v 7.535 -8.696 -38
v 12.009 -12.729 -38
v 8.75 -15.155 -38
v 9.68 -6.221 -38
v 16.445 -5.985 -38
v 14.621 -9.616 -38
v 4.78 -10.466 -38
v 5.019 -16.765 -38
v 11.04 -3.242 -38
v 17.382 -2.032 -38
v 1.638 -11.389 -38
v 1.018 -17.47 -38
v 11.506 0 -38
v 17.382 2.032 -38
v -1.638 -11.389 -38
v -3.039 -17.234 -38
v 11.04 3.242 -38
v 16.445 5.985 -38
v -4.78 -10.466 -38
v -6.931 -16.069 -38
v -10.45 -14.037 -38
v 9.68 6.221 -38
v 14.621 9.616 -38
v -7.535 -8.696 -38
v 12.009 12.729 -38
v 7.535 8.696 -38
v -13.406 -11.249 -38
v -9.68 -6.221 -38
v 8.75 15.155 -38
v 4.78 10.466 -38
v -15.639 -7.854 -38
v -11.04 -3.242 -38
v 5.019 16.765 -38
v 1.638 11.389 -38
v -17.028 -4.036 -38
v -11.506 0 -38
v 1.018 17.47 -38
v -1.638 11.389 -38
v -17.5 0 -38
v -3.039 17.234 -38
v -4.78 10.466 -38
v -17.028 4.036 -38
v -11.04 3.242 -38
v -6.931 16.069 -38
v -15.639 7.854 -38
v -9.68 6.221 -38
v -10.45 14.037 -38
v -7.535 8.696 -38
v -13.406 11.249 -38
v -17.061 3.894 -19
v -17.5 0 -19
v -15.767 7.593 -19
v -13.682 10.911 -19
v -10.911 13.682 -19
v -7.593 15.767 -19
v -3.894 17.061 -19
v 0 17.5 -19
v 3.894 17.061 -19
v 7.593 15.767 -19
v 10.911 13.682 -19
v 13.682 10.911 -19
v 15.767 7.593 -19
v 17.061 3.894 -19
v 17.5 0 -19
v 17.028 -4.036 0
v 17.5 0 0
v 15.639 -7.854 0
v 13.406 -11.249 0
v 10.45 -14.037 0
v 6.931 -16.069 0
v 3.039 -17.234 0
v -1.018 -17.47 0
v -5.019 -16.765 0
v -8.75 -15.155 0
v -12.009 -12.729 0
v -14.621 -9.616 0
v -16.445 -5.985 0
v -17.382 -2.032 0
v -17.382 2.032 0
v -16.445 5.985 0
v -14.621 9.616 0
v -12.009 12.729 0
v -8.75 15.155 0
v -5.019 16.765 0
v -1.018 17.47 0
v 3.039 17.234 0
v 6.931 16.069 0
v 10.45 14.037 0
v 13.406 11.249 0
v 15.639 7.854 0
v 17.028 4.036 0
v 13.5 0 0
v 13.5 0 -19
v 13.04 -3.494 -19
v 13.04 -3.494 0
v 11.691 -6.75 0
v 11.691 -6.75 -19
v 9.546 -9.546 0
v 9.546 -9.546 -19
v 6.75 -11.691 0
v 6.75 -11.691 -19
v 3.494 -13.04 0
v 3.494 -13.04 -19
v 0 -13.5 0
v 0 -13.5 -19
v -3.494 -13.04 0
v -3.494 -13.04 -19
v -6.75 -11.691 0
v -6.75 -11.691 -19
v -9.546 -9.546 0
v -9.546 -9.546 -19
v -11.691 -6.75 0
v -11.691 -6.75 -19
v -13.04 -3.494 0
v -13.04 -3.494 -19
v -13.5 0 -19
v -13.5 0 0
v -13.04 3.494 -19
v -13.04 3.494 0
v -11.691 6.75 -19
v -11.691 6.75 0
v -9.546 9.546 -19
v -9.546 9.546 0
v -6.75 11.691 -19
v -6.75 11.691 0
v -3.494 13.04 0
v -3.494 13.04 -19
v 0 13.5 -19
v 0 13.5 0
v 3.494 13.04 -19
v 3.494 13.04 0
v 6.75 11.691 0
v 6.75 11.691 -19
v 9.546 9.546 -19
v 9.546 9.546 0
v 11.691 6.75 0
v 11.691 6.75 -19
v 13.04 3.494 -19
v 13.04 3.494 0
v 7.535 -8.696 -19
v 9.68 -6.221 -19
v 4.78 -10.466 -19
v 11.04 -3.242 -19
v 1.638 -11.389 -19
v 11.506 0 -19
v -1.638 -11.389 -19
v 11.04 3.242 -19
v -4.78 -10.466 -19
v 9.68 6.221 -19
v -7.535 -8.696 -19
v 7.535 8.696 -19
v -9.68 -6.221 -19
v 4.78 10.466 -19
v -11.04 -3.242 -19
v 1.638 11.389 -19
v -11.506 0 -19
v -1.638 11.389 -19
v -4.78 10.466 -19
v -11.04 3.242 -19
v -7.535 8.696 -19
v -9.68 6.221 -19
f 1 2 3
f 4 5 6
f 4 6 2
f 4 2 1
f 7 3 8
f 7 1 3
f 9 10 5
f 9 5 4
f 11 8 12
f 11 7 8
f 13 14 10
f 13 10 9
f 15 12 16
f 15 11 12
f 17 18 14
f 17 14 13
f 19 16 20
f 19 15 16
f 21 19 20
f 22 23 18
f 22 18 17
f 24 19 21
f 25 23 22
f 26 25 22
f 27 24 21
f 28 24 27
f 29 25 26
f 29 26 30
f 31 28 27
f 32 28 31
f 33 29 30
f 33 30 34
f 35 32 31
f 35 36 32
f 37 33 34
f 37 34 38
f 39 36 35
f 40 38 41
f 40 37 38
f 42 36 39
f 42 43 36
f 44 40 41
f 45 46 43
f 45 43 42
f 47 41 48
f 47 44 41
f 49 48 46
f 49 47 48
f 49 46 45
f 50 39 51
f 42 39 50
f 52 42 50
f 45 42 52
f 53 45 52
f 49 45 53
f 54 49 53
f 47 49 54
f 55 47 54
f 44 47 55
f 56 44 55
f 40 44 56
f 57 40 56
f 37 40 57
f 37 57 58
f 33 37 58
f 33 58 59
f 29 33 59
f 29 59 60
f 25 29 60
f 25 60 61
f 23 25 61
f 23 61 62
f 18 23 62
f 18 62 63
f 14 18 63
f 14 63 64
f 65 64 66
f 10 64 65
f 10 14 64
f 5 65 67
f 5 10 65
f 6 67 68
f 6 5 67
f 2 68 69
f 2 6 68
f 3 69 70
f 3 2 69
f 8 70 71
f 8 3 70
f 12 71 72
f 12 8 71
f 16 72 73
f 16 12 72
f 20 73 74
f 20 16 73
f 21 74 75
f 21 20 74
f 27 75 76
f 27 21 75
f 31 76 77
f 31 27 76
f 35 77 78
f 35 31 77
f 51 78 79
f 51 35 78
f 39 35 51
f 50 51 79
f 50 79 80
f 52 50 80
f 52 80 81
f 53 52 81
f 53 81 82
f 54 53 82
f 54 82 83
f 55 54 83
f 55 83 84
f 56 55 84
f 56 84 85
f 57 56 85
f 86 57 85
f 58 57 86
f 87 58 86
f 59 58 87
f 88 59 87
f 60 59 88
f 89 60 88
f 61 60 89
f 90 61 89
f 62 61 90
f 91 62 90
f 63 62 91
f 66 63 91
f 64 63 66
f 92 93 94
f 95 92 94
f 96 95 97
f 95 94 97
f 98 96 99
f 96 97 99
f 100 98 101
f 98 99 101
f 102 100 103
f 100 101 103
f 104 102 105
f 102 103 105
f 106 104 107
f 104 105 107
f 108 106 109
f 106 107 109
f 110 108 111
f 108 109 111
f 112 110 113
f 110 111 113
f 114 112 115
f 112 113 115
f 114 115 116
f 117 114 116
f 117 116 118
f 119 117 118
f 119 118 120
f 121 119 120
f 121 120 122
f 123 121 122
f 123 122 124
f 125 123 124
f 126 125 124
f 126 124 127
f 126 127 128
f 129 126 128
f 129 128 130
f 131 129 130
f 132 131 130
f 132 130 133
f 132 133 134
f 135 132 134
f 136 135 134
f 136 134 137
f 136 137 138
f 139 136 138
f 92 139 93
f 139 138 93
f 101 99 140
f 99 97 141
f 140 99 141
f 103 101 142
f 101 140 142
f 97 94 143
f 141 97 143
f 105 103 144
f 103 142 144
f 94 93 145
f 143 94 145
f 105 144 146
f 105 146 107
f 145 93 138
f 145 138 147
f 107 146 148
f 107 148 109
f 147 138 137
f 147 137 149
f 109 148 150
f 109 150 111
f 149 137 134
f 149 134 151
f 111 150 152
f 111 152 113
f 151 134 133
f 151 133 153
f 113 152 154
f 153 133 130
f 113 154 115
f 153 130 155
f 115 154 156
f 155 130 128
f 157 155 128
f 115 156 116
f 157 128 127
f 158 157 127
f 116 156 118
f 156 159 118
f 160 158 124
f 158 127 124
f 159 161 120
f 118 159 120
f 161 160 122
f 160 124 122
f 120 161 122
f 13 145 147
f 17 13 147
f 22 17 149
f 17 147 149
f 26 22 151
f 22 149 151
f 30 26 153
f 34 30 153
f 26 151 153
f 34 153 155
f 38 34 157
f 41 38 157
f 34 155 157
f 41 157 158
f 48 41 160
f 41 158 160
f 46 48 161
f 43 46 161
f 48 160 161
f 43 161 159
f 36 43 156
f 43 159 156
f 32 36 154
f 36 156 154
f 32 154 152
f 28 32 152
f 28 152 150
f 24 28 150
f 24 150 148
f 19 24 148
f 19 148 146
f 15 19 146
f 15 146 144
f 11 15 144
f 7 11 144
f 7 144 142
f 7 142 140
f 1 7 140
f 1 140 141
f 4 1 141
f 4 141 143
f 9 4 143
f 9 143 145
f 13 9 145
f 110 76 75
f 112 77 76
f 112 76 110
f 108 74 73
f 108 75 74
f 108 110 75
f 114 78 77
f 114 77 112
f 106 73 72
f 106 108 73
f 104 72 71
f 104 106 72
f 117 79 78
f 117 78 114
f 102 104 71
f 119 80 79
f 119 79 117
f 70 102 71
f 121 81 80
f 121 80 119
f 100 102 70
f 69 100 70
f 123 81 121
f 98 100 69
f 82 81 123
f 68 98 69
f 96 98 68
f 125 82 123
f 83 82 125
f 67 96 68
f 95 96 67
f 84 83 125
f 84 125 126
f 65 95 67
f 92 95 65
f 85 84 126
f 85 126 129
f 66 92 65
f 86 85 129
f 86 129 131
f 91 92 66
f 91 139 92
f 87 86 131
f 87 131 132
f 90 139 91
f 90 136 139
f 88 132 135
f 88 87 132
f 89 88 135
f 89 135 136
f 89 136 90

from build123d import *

# Parameters (mm, degrees)
SKETCH1_R                     = 17.5
SKETCH1_R_2                   = 13.5
SKETCH2_R                     = 17.5
PIPE_TAP_DRILL_FOR_3_4_TAP1_D = 23.0124


with BuildPart() as part:
    # Sweep1: sweep along a curve in space
    with BuildLine() as sweep1_path:
        Line((0, 0, 0), (0, 0, -19))
    # Sketch1 → Sweep1 (sweep)
    with BuildSketch(Plane.XY):
        Circle(SKETCH1_R)
        Circle(SKETCH1_R_2, mode=Mode.SUBTRACT)
    sweep(path=sweep1_path.line)

    # Sweep2: sweep along a curve in space
    with BuildLine() as sweep2_path:
        Line((0, 0, -19), (0, 0, -38))
    # Sketch2 → Sweep2 (sweep)
    with BuildSketch(Plane(origin=(0, 0, -19), x_dir=(-1, 0, 0), z_dir=(0, 0, -1))):
        Circle(SKETCH2_R)
    sweep(path=sweep2_path.line)

    # Pipe Tap Drill for 3/4 Tap1 (through all)
    with Locations(Plane(origin=(0, 0, -38), x_dir=(-1, 0, 0), z_dir=(0, 0, -1))):
        with Locations((0, 0)):
            Hole(PIPE_TAP_DRILL_FOR_3_4_TAP1_D / 2)


solid = part.part
